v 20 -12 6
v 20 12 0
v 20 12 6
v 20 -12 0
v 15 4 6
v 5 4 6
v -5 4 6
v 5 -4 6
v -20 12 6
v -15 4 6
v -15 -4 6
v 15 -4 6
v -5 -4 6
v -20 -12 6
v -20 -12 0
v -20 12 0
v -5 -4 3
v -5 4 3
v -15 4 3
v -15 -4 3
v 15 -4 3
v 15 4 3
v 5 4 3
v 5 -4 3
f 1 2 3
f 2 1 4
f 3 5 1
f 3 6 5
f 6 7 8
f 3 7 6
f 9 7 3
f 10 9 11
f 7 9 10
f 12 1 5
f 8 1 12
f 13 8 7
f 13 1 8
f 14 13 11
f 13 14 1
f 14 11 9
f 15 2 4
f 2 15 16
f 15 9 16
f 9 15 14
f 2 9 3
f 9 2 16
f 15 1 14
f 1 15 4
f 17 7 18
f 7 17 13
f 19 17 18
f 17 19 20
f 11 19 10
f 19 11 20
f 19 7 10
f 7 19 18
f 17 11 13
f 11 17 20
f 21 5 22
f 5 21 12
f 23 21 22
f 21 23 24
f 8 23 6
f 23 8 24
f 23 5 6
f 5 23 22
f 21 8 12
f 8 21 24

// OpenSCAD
// Auto-generated from tests/data/feature_fixtures_manifest.json
// fixture: plate_two_rectangular_pockets
// fixture_type: plate
// description: Two symmetrically placed rectangular blind pockets in a thick plate.
$fn = 96;

plate_size = [40.000000, 24.000000, 6.000000];
plate_origin = [-20.000000, -12.000000, 0.000000];

module through_hole(center, diameter, height) {
  translate(center) cylinder(d=diameter, h=height, center=false);
}

module through_slot(start, end, width, height) {
  hull() {
    through_hole(start, width, height);
    through_hole(end, width, height);
  }
}

module counterbore_hole(center, through_d, bore_d, bore_depth, plate_thickness) {
  translate([center[0], center[1], -0.1])
    cylinder(d=through_d, h=plate_thickness + 0.2, center=false);
  translate([center[0], center[1], plate_thickness - bore_depth])
    cylinder(d=bore_d, h=bore_depth + 0.1, center=false);
}

module rectangular_through_cutout(center, size_xy, plate_thickness) {
  translate([center[0] - size_xy[0] / 2, center[1] - size_xy[1] / 2, -0.1])
    cube([size_xy[0], size_xy[1], plate_thickness + 0.2]);
}

module rectangular_top_pocket(center, size_xy, pocket_depth, plate_thickness) {
  translate([center[0] - size_xy[0] / 2, center[1] - size_xy[1] / 2, plate_thickness - pocket_depth])
    cube([size_xy[0], size_xy[1], pocket_depth + 0.1]);
}

difference() {
  translate(plate_origin) cube(plate_size);
  rectangular_top_pocket([-10.000000, 0.000000, 0.000000], [10.000000, 8.000000], 3.000000, 6.000000);  // rectangular_pocket_0
  rectangular_top_pocket([10.000000, 0.000000, 0.000000], [10.000000, 8.000000], 3.000000, 6.000000);  // rectangular_pocket_1
}
